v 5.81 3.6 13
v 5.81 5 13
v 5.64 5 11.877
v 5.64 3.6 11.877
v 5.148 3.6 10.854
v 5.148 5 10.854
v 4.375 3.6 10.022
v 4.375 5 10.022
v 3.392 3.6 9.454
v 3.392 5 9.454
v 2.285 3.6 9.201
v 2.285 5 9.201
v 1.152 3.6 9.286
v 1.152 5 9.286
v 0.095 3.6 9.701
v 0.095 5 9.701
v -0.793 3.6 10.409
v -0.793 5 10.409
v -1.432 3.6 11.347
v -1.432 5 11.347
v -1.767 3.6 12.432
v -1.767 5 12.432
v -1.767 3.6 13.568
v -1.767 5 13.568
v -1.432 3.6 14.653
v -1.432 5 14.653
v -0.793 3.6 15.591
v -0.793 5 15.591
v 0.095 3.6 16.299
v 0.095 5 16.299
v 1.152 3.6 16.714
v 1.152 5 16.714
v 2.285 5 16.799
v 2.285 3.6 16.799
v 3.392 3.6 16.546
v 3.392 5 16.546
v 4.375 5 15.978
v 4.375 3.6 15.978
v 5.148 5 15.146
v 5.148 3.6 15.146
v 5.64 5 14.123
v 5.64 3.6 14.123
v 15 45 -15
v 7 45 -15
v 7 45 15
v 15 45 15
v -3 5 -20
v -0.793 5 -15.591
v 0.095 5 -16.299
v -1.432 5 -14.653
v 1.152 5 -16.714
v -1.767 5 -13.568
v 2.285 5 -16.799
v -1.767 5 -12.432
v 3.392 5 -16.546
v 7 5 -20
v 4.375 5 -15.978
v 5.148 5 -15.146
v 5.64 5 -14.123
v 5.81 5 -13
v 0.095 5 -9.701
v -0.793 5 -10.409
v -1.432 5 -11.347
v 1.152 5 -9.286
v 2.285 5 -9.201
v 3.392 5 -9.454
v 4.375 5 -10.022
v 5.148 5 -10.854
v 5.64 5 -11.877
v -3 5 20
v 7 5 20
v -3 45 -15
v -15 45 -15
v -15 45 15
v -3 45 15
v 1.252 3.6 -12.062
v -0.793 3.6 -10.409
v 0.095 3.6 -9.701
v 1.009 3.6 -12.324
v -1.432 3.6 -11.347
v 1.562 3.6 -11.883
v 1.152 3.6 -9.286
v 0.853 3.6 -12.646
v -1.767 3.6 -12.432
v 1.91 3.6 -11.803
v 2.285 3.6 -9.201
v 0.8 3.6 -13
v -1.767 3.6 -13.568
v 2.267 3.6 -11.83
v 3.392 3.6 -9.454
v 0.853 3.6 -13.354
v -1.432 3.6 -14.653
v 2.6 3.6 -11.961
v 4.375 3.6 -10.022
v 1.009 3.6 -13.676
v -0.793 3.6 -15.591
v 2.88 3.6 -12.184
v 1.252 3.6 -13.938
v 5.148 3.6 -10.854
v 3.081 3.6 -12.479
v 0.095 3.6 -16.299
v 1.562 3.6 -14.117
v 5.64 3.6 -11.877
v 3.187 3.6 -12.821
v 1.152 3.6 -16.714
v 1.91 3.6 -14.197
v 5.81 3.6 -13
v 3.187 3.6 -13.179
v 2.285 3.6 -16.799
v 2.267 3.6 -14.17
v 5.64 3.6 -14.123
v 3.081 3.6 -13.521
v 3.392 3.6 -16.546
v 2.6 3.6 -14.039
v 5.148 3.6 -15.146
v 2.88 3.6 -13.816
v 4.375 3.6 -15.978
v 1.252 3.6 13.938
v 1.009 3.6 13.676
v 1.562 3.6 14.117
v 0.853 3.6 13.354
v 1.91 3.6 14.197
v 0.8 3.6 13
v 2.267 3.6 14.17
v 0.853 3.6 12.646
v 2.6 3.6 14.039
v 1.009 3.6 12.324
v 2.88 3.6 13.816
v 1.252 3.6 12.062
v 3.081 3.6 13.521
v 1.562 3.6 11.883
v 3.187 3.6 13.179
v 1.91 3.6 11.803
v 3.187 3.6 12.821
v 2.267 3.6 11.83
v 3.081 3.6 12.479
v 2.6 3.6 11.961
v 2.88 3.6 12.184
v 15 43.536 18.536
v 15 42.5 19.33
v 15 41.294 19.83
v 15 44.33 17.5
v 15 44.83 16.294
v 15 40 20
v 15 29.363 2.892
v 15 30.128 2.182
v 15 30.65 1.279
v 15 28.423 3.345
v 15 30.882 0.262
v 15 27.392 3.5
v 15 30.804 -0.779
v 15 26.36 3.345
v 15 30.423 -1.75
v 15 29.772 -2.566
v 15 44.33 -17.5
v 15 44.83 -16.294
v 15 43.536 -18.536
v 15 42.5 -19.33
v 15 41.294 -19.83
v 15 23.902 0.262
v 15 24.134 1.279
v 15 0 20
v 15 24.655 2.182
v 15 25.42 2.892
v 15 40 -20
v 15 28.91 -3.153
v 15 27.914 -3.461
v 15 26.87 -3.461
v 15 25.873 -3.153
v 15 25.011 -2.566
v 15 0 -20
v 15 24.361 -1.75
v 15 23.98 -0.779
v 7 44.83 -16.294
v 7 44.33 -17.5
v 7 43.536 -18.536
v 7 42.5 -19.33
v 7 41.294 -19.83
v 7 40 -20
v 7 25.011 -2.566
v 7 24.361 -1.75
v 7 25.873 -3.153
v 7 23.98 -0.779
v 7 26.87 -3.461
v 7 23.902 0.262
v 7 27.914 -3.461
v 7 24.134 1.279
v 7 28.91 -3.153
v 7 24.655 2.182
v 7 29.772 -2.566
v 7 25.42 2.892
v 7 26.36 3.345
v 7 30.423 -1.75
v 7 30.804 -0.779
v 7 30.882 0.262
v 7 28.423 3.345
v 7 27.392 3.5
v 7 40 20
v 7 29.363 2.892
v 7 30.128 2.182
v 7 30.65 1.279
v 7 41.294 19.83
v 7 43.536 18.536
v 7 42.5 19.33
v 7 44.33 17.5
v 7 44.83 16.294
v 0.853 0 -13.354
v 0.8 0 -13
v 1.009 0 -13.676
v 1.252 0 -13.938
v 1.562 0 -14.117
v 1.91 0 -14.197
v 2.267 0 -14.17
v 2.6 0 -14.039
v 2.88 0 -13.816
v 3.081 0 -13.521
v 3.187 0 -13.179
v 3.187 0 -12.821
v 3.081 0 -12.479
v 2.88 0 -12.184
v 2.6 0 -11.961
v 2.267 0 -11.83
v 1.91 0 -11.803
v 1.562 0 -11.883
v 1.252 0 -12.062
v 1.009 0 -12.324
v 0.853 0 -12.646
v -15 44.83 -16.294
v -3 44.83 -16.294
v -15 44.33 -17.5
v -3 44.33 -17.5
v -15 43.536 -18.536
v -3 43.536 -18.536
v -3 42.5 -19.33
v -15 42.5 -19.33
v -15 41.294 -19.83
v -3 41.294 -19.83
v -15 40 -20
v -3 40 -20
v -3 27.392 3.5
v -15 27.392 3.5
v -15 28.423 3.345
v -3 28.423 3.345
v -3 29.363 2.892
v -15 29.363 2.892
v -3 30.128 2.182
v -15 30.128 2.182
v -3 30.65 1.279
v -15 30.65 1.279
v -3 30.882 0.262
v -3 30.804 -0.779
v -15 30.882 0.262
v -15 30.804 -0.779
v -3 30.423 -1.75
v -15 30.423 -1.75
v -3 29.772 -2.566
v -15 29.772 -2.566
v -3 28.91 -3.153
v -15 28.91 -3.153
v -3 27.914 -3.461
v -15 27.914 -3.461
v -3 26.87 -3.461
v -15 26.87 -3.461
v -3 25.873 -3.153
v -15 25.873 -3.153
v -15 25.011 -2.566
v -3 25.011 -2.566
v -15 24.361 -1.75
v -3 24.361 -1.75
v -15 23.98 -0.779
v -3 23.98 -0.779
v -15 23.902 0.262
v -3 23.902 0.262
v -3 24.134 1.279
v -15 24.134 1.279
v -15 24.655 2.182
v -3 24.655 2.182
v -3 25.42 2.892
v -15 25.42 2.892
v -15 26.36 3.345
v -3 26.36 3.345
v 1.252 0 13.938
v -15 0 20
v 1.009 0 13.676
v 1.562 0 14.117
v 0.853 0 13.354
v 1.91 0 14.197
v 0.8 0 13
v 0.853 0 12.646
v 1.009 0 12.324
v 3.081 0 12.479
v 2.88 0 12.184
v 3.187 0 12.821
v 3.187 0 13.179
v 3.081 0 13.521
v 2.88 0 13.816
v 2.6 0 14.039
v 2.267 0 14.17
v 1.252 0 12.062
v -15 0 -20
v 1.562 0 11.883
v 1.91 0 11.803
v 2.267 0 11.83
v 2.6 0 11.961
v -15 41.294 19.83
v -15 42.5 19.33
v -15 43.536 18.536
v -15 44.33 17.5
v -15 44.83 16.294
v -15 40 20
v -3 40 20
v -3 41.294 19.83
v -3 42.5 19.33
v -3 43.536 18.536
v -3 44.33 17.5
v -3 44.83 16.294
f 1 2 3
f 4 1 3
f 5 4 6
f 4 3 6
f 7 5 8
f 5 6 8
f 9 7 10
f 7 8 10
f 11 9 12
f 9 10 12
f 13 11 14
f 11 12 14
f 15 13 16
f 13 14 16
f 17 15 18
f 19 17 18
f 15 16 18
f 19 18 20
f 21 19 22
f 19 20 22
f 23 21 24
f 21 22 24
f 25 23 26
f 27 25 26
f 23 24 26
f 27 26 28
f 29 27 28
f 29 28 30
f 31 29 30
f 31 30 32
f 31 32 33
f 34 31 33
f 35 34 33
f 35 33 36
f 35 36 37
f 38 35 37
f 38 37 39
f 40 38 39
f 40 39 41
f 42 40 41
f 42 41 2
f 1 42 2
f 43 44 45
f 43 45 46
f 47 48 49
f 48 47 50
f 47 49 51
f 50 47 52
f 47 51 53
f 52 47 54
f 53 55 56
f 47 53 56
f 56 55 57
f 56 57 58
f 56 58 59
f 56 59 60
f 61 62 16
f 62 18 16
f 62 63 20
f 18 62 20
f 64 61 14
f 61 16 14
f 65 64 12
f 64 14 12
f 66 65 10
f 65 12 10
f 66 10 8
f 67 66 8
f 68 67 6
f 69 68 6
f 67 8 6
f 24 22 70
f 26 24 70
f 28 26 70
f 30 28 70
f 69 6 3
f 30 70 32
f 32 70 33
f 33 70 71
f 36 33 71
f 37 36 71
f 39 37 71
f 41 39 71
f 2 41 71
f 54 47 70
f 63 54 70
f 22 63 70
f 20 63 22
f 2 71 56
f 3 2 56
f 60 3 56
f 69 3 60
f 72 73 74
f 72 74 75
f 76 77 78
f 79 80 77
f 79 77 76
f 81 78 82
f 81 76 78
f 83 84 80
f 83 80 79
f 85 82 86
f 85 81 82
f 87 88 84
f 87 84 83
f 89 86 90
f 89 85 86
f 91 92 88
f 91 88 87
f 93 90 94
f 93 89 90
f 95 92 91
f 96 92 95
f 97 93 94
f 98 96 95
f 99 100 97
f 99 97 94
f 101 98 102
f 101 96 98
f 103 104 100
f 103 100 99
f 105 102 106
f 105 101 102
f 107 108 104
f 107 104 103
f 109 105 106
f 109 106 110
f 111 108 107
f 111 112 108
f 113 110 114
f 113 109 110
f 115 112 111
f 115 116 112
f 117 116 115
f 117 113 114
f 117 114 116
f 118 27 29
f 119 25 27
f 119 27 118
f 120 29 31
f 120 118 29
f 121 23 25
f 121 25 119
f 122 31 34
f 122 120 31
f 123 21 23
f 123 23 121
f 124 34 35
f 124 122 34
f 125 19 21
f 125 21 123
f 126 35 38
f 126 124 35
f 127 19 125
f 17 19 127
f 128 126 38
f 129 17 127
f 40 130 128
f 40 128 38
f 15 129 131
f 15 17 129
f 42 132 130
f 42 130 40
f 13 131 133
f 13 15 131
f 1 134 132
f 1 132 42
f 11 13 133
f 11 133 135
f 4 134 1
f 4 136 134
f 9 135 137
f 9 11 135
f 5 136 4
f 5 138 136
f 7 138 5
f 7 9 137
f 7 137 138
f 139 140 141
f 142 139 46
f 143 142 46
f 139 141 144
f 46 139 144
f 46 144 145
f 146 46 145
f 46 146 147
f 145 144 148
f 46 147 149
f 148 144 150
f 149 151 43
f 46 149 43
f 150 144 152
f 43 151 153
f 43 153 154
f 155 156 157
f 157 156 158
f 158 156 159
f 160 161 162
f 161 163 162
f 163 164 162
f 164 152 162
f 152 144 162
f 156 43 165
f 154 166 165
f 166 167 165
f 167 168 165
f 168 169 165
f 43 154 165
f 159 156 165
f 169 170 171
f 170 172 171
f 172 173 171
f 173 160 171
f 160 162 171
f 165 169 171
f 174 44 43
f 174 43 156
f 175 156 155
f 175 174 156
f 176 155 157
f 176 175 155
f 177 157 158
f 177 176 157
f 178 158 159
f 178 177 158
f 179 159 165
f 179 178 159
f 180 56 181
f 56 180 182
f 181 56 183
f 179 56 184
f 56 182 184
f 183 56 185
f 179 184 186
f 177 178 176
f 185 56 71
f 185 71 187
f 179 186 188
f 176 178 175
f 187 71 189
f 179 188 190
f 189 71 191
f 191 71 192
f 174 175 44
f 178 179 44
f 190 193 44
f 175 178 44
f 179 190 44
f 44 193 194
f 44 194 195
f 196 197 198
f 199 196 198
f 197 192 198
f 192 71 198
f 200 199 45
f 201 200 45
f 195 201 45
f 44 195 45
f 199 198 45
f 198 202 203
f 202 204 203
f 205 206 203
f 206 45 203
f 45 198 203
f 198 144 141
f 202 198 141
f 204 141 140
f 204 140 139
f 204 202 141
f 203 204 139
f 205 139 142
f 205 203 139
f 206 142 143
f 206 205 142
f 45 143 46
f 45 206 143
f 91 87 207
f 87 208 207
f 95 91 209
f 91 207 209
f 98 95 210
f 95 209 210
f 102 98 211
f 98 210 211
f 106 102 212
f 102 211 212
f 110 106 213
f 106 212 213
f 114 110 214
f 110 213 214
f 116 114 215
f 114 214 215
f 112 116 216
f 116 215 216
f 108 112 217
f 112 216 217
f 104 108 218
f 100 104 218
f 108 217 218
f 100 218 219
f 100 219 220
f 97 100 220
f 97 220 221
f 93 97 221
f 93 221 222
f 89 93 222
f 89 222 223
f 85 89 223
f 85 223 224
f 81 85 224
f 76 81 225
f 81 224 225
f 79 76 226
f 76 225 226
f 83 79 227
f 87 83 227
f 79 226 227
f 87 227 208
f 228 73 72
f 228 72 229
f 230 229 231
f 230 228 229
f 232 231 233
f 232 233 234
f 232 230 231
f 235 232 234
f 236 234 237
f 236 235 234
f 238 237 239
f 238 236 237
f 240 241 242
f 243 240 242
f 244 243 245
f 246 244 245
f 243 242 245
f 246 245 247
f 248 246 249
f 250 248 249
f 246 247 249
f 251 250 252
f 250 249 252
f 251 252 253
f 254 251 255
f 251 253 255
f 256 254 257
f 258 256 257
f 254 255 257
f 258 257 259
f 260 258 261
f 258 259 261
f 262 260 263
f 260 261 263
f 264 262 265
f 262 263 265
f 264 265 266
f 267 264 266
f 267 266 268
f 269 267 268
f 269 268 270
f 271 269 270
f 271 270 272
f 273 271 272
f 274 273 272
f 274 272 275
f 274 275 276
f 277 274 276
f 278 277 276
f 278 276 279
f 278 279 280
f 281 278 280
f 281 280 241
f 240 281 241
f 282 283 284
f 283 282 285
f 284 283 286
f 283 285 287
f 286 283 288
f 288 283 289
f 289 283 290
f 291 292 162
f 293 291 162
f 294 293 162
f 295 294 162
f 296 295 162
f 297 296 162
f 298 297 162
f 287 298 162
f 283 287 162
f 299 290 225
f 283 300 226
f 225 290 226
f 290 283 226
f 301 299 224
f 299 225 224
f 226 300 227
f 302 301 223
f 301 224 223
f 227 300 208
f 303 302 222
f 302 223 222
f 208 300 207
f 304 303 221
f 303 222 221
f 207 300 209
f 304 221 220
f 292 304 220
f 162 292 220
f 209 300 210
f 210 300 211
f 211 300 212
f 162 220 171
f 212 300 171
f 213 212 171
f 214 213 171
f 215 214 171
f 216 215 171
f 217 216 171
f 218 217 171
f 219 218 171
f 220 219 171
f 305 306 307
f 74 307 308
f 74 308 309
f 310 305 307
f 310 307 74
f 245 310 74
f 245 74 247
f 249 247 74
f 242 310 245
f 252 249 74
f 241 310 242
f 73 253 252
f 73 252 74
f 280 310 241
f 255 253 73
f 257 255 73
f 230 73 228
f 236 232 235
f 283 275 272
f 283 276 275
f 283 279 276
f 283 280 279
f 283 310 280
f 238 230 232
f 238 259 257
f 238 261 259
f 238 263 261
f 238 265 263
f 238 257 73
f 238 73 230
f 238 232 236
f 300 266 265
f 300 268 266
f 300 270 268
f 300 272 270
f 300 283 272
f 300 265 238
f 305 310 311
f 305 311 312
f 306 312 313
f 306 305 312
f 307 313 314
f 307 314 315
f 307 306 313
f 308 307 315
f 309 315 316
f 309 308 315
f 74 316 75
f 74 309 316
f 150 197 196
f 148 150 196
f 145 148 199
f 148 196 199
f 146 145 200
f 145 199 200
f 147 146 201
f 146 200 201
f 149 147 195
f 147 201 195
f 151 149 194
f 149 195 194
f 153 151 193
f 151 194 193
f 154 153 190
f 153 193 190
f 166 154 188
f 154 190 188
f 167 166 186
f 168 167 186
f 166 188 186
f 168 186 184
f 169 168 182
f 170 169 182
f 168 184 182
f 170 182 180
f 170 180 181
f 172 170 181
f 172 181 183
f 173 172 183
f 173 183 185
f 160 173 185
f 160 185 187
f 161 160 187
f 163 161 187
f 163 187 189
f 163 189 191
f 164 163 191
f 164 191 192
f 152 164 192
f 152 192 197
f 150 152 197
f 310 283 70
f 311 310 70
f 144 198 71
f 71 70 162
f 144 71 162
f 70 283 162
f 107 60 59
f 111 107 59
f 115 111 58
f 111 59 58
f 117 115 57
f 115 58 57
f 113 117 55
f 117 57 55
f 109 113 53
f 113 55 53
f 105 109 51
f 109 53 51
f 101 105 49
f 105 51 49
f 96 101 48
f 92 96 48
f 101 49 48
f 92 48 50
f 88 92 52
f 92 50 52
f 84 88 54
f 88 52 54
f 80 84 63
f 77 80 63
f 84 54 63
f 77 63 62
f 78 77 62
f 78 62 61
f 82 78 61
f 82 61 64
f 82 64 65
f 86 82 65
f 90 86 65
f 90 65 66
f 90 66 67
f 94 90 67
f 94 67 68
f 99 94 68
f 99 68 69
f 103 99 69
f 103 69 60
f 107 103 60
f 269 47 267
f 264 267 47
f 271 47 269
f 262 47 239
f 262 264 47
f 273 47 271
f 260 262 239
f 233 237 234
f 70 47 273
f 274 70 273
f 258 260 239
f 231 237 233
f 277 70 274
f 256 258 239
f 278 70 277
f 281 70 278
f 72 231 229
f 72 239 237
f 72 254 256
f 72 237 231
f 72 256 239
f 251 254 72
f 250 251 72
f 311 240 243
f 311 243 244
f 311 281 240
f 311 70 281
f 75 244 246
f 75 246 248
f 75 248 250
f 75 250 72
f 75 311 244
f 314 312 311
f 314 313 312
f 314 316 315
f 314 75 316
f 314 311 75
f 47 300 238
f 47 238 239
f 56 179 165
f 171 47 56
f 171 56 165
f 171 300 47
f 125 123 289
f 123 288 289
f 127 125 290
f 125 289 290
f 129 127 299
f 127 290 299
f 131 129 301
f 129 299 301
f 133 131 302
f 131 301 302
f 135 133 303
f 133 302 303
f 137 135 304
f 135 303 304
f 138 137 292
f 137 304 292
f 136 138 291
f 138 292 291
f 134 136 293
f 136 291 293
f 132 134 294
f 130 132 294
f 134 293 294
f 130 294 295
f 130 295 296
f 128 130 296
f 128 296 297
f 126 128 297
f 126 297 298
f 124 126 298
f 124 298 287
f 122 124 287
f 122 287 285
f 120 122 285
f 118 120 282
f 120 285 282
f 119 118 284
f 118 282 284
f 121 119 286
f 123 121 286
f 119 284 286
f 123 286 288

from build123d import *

# Parameters (mm, degrees)
SKETCH1_W                                    = 30
SKETCH1_H                                    = 40
BOSS_EXTRUDE1_DEPTH                          = 45
SKETCH2_W                                    = 10
SKETCH2_H                                    = 40
CUT_EXTRUDE1_DEPTH                           = 63.04836823
SKETCH3_R                                    = 3.5
CUT_EXTRUDE2_DEPTH                           = 58.662812973
CUT_EXTRUDE3_DEPTH                           = 58.662812973
CBORE_FOR_M2_HEX_HEAD_CAP_SCREW1_D           = 2.4
CBORE_FOR_M2_HEX_HEAD_CAP_SCREW1_CBORE_D     = 7.619
CBORE_FOR_M2_HEX_HEAD_CAP_SCREW1_CBORE_DEPTH = 1.4


with BuildPart() as part:
    # Sketch1 → Boss-Extrude1 (new body)
    with BuildSketch(Plane(origin=(0, 0, 0), x_dir=(1, 0, 0), z_dir=(0, 1, 0))):
        Rectangle(SKETCH1_W, SKETCH1_H)
    extrude(amount=BOSS_EXTRUDE1_DEPTH)

    # Sketch2 → Cut-Extrude1 (cut, through all)
    with BuildSketch(Plane.XY.offset(20)):
        with Locations((2, 25)):
            Rectangle(SKETCH2_W, SKETCH2_H)
    extrude(amount=-CUT_EXTRUDE1_DEPTH, mode=Mode.SUBTRACT)

    # Sketch3 → Cut-Extrude2 (cut, through all)
    with BuildSketch(Plane.ZY.offset(15)):
        with Locations((0, 27.391853945)):
            Circle(SKETCH3_R)
    extrude(amount=-CUT_EXTRUDE2_DEPTH, mode=Mode.SUBTRACT)

    # Sketch4 → Cut-Extrude3 (cut, through all)
    with BuildSketch(Plane.ZY.offset(15)):
        with BuildLine():
            Line((-20, 45), (-15, 45))
            ThreePointArc((-15, 45), (-18.535533906, 43.535533906), (-20, 40))
            Line((-20, 40), (-20, 45))
        make_face()
        with BuildLine():
            Line((15, 45), (20, 45))
            Line((20, 45), (20, 40))
            ThreePointArc((20, 40), (18.535533906, 43.535533906), (15, 45))
        make_face()
    extrude(amount=-CUT_EXTRUDE3_DEPTH, mode=Mode.SUBTRACT)

    # CBORE for M2 Hex Head Cap Screw1 (through all)
    with Locations(Plane(origin=(0, 5, 0), x_dir=(1, 0, 0), z_dir=(0, 1, 0))):
        with Locations((2, -13), (2, 13)):
            CounterBoreHole(CBORE_FOR_M2_HEX_HEAD_CAP_SCREW1_D / 2, CBORE_FOR_M2_HEX_HEAD_CAP_SCREW1_CBORE_D / 2, CBORE_FOR_M2_HEX_HEAD_CAP_SCREW1_CBORE_DEPTH)


solid = part.part
